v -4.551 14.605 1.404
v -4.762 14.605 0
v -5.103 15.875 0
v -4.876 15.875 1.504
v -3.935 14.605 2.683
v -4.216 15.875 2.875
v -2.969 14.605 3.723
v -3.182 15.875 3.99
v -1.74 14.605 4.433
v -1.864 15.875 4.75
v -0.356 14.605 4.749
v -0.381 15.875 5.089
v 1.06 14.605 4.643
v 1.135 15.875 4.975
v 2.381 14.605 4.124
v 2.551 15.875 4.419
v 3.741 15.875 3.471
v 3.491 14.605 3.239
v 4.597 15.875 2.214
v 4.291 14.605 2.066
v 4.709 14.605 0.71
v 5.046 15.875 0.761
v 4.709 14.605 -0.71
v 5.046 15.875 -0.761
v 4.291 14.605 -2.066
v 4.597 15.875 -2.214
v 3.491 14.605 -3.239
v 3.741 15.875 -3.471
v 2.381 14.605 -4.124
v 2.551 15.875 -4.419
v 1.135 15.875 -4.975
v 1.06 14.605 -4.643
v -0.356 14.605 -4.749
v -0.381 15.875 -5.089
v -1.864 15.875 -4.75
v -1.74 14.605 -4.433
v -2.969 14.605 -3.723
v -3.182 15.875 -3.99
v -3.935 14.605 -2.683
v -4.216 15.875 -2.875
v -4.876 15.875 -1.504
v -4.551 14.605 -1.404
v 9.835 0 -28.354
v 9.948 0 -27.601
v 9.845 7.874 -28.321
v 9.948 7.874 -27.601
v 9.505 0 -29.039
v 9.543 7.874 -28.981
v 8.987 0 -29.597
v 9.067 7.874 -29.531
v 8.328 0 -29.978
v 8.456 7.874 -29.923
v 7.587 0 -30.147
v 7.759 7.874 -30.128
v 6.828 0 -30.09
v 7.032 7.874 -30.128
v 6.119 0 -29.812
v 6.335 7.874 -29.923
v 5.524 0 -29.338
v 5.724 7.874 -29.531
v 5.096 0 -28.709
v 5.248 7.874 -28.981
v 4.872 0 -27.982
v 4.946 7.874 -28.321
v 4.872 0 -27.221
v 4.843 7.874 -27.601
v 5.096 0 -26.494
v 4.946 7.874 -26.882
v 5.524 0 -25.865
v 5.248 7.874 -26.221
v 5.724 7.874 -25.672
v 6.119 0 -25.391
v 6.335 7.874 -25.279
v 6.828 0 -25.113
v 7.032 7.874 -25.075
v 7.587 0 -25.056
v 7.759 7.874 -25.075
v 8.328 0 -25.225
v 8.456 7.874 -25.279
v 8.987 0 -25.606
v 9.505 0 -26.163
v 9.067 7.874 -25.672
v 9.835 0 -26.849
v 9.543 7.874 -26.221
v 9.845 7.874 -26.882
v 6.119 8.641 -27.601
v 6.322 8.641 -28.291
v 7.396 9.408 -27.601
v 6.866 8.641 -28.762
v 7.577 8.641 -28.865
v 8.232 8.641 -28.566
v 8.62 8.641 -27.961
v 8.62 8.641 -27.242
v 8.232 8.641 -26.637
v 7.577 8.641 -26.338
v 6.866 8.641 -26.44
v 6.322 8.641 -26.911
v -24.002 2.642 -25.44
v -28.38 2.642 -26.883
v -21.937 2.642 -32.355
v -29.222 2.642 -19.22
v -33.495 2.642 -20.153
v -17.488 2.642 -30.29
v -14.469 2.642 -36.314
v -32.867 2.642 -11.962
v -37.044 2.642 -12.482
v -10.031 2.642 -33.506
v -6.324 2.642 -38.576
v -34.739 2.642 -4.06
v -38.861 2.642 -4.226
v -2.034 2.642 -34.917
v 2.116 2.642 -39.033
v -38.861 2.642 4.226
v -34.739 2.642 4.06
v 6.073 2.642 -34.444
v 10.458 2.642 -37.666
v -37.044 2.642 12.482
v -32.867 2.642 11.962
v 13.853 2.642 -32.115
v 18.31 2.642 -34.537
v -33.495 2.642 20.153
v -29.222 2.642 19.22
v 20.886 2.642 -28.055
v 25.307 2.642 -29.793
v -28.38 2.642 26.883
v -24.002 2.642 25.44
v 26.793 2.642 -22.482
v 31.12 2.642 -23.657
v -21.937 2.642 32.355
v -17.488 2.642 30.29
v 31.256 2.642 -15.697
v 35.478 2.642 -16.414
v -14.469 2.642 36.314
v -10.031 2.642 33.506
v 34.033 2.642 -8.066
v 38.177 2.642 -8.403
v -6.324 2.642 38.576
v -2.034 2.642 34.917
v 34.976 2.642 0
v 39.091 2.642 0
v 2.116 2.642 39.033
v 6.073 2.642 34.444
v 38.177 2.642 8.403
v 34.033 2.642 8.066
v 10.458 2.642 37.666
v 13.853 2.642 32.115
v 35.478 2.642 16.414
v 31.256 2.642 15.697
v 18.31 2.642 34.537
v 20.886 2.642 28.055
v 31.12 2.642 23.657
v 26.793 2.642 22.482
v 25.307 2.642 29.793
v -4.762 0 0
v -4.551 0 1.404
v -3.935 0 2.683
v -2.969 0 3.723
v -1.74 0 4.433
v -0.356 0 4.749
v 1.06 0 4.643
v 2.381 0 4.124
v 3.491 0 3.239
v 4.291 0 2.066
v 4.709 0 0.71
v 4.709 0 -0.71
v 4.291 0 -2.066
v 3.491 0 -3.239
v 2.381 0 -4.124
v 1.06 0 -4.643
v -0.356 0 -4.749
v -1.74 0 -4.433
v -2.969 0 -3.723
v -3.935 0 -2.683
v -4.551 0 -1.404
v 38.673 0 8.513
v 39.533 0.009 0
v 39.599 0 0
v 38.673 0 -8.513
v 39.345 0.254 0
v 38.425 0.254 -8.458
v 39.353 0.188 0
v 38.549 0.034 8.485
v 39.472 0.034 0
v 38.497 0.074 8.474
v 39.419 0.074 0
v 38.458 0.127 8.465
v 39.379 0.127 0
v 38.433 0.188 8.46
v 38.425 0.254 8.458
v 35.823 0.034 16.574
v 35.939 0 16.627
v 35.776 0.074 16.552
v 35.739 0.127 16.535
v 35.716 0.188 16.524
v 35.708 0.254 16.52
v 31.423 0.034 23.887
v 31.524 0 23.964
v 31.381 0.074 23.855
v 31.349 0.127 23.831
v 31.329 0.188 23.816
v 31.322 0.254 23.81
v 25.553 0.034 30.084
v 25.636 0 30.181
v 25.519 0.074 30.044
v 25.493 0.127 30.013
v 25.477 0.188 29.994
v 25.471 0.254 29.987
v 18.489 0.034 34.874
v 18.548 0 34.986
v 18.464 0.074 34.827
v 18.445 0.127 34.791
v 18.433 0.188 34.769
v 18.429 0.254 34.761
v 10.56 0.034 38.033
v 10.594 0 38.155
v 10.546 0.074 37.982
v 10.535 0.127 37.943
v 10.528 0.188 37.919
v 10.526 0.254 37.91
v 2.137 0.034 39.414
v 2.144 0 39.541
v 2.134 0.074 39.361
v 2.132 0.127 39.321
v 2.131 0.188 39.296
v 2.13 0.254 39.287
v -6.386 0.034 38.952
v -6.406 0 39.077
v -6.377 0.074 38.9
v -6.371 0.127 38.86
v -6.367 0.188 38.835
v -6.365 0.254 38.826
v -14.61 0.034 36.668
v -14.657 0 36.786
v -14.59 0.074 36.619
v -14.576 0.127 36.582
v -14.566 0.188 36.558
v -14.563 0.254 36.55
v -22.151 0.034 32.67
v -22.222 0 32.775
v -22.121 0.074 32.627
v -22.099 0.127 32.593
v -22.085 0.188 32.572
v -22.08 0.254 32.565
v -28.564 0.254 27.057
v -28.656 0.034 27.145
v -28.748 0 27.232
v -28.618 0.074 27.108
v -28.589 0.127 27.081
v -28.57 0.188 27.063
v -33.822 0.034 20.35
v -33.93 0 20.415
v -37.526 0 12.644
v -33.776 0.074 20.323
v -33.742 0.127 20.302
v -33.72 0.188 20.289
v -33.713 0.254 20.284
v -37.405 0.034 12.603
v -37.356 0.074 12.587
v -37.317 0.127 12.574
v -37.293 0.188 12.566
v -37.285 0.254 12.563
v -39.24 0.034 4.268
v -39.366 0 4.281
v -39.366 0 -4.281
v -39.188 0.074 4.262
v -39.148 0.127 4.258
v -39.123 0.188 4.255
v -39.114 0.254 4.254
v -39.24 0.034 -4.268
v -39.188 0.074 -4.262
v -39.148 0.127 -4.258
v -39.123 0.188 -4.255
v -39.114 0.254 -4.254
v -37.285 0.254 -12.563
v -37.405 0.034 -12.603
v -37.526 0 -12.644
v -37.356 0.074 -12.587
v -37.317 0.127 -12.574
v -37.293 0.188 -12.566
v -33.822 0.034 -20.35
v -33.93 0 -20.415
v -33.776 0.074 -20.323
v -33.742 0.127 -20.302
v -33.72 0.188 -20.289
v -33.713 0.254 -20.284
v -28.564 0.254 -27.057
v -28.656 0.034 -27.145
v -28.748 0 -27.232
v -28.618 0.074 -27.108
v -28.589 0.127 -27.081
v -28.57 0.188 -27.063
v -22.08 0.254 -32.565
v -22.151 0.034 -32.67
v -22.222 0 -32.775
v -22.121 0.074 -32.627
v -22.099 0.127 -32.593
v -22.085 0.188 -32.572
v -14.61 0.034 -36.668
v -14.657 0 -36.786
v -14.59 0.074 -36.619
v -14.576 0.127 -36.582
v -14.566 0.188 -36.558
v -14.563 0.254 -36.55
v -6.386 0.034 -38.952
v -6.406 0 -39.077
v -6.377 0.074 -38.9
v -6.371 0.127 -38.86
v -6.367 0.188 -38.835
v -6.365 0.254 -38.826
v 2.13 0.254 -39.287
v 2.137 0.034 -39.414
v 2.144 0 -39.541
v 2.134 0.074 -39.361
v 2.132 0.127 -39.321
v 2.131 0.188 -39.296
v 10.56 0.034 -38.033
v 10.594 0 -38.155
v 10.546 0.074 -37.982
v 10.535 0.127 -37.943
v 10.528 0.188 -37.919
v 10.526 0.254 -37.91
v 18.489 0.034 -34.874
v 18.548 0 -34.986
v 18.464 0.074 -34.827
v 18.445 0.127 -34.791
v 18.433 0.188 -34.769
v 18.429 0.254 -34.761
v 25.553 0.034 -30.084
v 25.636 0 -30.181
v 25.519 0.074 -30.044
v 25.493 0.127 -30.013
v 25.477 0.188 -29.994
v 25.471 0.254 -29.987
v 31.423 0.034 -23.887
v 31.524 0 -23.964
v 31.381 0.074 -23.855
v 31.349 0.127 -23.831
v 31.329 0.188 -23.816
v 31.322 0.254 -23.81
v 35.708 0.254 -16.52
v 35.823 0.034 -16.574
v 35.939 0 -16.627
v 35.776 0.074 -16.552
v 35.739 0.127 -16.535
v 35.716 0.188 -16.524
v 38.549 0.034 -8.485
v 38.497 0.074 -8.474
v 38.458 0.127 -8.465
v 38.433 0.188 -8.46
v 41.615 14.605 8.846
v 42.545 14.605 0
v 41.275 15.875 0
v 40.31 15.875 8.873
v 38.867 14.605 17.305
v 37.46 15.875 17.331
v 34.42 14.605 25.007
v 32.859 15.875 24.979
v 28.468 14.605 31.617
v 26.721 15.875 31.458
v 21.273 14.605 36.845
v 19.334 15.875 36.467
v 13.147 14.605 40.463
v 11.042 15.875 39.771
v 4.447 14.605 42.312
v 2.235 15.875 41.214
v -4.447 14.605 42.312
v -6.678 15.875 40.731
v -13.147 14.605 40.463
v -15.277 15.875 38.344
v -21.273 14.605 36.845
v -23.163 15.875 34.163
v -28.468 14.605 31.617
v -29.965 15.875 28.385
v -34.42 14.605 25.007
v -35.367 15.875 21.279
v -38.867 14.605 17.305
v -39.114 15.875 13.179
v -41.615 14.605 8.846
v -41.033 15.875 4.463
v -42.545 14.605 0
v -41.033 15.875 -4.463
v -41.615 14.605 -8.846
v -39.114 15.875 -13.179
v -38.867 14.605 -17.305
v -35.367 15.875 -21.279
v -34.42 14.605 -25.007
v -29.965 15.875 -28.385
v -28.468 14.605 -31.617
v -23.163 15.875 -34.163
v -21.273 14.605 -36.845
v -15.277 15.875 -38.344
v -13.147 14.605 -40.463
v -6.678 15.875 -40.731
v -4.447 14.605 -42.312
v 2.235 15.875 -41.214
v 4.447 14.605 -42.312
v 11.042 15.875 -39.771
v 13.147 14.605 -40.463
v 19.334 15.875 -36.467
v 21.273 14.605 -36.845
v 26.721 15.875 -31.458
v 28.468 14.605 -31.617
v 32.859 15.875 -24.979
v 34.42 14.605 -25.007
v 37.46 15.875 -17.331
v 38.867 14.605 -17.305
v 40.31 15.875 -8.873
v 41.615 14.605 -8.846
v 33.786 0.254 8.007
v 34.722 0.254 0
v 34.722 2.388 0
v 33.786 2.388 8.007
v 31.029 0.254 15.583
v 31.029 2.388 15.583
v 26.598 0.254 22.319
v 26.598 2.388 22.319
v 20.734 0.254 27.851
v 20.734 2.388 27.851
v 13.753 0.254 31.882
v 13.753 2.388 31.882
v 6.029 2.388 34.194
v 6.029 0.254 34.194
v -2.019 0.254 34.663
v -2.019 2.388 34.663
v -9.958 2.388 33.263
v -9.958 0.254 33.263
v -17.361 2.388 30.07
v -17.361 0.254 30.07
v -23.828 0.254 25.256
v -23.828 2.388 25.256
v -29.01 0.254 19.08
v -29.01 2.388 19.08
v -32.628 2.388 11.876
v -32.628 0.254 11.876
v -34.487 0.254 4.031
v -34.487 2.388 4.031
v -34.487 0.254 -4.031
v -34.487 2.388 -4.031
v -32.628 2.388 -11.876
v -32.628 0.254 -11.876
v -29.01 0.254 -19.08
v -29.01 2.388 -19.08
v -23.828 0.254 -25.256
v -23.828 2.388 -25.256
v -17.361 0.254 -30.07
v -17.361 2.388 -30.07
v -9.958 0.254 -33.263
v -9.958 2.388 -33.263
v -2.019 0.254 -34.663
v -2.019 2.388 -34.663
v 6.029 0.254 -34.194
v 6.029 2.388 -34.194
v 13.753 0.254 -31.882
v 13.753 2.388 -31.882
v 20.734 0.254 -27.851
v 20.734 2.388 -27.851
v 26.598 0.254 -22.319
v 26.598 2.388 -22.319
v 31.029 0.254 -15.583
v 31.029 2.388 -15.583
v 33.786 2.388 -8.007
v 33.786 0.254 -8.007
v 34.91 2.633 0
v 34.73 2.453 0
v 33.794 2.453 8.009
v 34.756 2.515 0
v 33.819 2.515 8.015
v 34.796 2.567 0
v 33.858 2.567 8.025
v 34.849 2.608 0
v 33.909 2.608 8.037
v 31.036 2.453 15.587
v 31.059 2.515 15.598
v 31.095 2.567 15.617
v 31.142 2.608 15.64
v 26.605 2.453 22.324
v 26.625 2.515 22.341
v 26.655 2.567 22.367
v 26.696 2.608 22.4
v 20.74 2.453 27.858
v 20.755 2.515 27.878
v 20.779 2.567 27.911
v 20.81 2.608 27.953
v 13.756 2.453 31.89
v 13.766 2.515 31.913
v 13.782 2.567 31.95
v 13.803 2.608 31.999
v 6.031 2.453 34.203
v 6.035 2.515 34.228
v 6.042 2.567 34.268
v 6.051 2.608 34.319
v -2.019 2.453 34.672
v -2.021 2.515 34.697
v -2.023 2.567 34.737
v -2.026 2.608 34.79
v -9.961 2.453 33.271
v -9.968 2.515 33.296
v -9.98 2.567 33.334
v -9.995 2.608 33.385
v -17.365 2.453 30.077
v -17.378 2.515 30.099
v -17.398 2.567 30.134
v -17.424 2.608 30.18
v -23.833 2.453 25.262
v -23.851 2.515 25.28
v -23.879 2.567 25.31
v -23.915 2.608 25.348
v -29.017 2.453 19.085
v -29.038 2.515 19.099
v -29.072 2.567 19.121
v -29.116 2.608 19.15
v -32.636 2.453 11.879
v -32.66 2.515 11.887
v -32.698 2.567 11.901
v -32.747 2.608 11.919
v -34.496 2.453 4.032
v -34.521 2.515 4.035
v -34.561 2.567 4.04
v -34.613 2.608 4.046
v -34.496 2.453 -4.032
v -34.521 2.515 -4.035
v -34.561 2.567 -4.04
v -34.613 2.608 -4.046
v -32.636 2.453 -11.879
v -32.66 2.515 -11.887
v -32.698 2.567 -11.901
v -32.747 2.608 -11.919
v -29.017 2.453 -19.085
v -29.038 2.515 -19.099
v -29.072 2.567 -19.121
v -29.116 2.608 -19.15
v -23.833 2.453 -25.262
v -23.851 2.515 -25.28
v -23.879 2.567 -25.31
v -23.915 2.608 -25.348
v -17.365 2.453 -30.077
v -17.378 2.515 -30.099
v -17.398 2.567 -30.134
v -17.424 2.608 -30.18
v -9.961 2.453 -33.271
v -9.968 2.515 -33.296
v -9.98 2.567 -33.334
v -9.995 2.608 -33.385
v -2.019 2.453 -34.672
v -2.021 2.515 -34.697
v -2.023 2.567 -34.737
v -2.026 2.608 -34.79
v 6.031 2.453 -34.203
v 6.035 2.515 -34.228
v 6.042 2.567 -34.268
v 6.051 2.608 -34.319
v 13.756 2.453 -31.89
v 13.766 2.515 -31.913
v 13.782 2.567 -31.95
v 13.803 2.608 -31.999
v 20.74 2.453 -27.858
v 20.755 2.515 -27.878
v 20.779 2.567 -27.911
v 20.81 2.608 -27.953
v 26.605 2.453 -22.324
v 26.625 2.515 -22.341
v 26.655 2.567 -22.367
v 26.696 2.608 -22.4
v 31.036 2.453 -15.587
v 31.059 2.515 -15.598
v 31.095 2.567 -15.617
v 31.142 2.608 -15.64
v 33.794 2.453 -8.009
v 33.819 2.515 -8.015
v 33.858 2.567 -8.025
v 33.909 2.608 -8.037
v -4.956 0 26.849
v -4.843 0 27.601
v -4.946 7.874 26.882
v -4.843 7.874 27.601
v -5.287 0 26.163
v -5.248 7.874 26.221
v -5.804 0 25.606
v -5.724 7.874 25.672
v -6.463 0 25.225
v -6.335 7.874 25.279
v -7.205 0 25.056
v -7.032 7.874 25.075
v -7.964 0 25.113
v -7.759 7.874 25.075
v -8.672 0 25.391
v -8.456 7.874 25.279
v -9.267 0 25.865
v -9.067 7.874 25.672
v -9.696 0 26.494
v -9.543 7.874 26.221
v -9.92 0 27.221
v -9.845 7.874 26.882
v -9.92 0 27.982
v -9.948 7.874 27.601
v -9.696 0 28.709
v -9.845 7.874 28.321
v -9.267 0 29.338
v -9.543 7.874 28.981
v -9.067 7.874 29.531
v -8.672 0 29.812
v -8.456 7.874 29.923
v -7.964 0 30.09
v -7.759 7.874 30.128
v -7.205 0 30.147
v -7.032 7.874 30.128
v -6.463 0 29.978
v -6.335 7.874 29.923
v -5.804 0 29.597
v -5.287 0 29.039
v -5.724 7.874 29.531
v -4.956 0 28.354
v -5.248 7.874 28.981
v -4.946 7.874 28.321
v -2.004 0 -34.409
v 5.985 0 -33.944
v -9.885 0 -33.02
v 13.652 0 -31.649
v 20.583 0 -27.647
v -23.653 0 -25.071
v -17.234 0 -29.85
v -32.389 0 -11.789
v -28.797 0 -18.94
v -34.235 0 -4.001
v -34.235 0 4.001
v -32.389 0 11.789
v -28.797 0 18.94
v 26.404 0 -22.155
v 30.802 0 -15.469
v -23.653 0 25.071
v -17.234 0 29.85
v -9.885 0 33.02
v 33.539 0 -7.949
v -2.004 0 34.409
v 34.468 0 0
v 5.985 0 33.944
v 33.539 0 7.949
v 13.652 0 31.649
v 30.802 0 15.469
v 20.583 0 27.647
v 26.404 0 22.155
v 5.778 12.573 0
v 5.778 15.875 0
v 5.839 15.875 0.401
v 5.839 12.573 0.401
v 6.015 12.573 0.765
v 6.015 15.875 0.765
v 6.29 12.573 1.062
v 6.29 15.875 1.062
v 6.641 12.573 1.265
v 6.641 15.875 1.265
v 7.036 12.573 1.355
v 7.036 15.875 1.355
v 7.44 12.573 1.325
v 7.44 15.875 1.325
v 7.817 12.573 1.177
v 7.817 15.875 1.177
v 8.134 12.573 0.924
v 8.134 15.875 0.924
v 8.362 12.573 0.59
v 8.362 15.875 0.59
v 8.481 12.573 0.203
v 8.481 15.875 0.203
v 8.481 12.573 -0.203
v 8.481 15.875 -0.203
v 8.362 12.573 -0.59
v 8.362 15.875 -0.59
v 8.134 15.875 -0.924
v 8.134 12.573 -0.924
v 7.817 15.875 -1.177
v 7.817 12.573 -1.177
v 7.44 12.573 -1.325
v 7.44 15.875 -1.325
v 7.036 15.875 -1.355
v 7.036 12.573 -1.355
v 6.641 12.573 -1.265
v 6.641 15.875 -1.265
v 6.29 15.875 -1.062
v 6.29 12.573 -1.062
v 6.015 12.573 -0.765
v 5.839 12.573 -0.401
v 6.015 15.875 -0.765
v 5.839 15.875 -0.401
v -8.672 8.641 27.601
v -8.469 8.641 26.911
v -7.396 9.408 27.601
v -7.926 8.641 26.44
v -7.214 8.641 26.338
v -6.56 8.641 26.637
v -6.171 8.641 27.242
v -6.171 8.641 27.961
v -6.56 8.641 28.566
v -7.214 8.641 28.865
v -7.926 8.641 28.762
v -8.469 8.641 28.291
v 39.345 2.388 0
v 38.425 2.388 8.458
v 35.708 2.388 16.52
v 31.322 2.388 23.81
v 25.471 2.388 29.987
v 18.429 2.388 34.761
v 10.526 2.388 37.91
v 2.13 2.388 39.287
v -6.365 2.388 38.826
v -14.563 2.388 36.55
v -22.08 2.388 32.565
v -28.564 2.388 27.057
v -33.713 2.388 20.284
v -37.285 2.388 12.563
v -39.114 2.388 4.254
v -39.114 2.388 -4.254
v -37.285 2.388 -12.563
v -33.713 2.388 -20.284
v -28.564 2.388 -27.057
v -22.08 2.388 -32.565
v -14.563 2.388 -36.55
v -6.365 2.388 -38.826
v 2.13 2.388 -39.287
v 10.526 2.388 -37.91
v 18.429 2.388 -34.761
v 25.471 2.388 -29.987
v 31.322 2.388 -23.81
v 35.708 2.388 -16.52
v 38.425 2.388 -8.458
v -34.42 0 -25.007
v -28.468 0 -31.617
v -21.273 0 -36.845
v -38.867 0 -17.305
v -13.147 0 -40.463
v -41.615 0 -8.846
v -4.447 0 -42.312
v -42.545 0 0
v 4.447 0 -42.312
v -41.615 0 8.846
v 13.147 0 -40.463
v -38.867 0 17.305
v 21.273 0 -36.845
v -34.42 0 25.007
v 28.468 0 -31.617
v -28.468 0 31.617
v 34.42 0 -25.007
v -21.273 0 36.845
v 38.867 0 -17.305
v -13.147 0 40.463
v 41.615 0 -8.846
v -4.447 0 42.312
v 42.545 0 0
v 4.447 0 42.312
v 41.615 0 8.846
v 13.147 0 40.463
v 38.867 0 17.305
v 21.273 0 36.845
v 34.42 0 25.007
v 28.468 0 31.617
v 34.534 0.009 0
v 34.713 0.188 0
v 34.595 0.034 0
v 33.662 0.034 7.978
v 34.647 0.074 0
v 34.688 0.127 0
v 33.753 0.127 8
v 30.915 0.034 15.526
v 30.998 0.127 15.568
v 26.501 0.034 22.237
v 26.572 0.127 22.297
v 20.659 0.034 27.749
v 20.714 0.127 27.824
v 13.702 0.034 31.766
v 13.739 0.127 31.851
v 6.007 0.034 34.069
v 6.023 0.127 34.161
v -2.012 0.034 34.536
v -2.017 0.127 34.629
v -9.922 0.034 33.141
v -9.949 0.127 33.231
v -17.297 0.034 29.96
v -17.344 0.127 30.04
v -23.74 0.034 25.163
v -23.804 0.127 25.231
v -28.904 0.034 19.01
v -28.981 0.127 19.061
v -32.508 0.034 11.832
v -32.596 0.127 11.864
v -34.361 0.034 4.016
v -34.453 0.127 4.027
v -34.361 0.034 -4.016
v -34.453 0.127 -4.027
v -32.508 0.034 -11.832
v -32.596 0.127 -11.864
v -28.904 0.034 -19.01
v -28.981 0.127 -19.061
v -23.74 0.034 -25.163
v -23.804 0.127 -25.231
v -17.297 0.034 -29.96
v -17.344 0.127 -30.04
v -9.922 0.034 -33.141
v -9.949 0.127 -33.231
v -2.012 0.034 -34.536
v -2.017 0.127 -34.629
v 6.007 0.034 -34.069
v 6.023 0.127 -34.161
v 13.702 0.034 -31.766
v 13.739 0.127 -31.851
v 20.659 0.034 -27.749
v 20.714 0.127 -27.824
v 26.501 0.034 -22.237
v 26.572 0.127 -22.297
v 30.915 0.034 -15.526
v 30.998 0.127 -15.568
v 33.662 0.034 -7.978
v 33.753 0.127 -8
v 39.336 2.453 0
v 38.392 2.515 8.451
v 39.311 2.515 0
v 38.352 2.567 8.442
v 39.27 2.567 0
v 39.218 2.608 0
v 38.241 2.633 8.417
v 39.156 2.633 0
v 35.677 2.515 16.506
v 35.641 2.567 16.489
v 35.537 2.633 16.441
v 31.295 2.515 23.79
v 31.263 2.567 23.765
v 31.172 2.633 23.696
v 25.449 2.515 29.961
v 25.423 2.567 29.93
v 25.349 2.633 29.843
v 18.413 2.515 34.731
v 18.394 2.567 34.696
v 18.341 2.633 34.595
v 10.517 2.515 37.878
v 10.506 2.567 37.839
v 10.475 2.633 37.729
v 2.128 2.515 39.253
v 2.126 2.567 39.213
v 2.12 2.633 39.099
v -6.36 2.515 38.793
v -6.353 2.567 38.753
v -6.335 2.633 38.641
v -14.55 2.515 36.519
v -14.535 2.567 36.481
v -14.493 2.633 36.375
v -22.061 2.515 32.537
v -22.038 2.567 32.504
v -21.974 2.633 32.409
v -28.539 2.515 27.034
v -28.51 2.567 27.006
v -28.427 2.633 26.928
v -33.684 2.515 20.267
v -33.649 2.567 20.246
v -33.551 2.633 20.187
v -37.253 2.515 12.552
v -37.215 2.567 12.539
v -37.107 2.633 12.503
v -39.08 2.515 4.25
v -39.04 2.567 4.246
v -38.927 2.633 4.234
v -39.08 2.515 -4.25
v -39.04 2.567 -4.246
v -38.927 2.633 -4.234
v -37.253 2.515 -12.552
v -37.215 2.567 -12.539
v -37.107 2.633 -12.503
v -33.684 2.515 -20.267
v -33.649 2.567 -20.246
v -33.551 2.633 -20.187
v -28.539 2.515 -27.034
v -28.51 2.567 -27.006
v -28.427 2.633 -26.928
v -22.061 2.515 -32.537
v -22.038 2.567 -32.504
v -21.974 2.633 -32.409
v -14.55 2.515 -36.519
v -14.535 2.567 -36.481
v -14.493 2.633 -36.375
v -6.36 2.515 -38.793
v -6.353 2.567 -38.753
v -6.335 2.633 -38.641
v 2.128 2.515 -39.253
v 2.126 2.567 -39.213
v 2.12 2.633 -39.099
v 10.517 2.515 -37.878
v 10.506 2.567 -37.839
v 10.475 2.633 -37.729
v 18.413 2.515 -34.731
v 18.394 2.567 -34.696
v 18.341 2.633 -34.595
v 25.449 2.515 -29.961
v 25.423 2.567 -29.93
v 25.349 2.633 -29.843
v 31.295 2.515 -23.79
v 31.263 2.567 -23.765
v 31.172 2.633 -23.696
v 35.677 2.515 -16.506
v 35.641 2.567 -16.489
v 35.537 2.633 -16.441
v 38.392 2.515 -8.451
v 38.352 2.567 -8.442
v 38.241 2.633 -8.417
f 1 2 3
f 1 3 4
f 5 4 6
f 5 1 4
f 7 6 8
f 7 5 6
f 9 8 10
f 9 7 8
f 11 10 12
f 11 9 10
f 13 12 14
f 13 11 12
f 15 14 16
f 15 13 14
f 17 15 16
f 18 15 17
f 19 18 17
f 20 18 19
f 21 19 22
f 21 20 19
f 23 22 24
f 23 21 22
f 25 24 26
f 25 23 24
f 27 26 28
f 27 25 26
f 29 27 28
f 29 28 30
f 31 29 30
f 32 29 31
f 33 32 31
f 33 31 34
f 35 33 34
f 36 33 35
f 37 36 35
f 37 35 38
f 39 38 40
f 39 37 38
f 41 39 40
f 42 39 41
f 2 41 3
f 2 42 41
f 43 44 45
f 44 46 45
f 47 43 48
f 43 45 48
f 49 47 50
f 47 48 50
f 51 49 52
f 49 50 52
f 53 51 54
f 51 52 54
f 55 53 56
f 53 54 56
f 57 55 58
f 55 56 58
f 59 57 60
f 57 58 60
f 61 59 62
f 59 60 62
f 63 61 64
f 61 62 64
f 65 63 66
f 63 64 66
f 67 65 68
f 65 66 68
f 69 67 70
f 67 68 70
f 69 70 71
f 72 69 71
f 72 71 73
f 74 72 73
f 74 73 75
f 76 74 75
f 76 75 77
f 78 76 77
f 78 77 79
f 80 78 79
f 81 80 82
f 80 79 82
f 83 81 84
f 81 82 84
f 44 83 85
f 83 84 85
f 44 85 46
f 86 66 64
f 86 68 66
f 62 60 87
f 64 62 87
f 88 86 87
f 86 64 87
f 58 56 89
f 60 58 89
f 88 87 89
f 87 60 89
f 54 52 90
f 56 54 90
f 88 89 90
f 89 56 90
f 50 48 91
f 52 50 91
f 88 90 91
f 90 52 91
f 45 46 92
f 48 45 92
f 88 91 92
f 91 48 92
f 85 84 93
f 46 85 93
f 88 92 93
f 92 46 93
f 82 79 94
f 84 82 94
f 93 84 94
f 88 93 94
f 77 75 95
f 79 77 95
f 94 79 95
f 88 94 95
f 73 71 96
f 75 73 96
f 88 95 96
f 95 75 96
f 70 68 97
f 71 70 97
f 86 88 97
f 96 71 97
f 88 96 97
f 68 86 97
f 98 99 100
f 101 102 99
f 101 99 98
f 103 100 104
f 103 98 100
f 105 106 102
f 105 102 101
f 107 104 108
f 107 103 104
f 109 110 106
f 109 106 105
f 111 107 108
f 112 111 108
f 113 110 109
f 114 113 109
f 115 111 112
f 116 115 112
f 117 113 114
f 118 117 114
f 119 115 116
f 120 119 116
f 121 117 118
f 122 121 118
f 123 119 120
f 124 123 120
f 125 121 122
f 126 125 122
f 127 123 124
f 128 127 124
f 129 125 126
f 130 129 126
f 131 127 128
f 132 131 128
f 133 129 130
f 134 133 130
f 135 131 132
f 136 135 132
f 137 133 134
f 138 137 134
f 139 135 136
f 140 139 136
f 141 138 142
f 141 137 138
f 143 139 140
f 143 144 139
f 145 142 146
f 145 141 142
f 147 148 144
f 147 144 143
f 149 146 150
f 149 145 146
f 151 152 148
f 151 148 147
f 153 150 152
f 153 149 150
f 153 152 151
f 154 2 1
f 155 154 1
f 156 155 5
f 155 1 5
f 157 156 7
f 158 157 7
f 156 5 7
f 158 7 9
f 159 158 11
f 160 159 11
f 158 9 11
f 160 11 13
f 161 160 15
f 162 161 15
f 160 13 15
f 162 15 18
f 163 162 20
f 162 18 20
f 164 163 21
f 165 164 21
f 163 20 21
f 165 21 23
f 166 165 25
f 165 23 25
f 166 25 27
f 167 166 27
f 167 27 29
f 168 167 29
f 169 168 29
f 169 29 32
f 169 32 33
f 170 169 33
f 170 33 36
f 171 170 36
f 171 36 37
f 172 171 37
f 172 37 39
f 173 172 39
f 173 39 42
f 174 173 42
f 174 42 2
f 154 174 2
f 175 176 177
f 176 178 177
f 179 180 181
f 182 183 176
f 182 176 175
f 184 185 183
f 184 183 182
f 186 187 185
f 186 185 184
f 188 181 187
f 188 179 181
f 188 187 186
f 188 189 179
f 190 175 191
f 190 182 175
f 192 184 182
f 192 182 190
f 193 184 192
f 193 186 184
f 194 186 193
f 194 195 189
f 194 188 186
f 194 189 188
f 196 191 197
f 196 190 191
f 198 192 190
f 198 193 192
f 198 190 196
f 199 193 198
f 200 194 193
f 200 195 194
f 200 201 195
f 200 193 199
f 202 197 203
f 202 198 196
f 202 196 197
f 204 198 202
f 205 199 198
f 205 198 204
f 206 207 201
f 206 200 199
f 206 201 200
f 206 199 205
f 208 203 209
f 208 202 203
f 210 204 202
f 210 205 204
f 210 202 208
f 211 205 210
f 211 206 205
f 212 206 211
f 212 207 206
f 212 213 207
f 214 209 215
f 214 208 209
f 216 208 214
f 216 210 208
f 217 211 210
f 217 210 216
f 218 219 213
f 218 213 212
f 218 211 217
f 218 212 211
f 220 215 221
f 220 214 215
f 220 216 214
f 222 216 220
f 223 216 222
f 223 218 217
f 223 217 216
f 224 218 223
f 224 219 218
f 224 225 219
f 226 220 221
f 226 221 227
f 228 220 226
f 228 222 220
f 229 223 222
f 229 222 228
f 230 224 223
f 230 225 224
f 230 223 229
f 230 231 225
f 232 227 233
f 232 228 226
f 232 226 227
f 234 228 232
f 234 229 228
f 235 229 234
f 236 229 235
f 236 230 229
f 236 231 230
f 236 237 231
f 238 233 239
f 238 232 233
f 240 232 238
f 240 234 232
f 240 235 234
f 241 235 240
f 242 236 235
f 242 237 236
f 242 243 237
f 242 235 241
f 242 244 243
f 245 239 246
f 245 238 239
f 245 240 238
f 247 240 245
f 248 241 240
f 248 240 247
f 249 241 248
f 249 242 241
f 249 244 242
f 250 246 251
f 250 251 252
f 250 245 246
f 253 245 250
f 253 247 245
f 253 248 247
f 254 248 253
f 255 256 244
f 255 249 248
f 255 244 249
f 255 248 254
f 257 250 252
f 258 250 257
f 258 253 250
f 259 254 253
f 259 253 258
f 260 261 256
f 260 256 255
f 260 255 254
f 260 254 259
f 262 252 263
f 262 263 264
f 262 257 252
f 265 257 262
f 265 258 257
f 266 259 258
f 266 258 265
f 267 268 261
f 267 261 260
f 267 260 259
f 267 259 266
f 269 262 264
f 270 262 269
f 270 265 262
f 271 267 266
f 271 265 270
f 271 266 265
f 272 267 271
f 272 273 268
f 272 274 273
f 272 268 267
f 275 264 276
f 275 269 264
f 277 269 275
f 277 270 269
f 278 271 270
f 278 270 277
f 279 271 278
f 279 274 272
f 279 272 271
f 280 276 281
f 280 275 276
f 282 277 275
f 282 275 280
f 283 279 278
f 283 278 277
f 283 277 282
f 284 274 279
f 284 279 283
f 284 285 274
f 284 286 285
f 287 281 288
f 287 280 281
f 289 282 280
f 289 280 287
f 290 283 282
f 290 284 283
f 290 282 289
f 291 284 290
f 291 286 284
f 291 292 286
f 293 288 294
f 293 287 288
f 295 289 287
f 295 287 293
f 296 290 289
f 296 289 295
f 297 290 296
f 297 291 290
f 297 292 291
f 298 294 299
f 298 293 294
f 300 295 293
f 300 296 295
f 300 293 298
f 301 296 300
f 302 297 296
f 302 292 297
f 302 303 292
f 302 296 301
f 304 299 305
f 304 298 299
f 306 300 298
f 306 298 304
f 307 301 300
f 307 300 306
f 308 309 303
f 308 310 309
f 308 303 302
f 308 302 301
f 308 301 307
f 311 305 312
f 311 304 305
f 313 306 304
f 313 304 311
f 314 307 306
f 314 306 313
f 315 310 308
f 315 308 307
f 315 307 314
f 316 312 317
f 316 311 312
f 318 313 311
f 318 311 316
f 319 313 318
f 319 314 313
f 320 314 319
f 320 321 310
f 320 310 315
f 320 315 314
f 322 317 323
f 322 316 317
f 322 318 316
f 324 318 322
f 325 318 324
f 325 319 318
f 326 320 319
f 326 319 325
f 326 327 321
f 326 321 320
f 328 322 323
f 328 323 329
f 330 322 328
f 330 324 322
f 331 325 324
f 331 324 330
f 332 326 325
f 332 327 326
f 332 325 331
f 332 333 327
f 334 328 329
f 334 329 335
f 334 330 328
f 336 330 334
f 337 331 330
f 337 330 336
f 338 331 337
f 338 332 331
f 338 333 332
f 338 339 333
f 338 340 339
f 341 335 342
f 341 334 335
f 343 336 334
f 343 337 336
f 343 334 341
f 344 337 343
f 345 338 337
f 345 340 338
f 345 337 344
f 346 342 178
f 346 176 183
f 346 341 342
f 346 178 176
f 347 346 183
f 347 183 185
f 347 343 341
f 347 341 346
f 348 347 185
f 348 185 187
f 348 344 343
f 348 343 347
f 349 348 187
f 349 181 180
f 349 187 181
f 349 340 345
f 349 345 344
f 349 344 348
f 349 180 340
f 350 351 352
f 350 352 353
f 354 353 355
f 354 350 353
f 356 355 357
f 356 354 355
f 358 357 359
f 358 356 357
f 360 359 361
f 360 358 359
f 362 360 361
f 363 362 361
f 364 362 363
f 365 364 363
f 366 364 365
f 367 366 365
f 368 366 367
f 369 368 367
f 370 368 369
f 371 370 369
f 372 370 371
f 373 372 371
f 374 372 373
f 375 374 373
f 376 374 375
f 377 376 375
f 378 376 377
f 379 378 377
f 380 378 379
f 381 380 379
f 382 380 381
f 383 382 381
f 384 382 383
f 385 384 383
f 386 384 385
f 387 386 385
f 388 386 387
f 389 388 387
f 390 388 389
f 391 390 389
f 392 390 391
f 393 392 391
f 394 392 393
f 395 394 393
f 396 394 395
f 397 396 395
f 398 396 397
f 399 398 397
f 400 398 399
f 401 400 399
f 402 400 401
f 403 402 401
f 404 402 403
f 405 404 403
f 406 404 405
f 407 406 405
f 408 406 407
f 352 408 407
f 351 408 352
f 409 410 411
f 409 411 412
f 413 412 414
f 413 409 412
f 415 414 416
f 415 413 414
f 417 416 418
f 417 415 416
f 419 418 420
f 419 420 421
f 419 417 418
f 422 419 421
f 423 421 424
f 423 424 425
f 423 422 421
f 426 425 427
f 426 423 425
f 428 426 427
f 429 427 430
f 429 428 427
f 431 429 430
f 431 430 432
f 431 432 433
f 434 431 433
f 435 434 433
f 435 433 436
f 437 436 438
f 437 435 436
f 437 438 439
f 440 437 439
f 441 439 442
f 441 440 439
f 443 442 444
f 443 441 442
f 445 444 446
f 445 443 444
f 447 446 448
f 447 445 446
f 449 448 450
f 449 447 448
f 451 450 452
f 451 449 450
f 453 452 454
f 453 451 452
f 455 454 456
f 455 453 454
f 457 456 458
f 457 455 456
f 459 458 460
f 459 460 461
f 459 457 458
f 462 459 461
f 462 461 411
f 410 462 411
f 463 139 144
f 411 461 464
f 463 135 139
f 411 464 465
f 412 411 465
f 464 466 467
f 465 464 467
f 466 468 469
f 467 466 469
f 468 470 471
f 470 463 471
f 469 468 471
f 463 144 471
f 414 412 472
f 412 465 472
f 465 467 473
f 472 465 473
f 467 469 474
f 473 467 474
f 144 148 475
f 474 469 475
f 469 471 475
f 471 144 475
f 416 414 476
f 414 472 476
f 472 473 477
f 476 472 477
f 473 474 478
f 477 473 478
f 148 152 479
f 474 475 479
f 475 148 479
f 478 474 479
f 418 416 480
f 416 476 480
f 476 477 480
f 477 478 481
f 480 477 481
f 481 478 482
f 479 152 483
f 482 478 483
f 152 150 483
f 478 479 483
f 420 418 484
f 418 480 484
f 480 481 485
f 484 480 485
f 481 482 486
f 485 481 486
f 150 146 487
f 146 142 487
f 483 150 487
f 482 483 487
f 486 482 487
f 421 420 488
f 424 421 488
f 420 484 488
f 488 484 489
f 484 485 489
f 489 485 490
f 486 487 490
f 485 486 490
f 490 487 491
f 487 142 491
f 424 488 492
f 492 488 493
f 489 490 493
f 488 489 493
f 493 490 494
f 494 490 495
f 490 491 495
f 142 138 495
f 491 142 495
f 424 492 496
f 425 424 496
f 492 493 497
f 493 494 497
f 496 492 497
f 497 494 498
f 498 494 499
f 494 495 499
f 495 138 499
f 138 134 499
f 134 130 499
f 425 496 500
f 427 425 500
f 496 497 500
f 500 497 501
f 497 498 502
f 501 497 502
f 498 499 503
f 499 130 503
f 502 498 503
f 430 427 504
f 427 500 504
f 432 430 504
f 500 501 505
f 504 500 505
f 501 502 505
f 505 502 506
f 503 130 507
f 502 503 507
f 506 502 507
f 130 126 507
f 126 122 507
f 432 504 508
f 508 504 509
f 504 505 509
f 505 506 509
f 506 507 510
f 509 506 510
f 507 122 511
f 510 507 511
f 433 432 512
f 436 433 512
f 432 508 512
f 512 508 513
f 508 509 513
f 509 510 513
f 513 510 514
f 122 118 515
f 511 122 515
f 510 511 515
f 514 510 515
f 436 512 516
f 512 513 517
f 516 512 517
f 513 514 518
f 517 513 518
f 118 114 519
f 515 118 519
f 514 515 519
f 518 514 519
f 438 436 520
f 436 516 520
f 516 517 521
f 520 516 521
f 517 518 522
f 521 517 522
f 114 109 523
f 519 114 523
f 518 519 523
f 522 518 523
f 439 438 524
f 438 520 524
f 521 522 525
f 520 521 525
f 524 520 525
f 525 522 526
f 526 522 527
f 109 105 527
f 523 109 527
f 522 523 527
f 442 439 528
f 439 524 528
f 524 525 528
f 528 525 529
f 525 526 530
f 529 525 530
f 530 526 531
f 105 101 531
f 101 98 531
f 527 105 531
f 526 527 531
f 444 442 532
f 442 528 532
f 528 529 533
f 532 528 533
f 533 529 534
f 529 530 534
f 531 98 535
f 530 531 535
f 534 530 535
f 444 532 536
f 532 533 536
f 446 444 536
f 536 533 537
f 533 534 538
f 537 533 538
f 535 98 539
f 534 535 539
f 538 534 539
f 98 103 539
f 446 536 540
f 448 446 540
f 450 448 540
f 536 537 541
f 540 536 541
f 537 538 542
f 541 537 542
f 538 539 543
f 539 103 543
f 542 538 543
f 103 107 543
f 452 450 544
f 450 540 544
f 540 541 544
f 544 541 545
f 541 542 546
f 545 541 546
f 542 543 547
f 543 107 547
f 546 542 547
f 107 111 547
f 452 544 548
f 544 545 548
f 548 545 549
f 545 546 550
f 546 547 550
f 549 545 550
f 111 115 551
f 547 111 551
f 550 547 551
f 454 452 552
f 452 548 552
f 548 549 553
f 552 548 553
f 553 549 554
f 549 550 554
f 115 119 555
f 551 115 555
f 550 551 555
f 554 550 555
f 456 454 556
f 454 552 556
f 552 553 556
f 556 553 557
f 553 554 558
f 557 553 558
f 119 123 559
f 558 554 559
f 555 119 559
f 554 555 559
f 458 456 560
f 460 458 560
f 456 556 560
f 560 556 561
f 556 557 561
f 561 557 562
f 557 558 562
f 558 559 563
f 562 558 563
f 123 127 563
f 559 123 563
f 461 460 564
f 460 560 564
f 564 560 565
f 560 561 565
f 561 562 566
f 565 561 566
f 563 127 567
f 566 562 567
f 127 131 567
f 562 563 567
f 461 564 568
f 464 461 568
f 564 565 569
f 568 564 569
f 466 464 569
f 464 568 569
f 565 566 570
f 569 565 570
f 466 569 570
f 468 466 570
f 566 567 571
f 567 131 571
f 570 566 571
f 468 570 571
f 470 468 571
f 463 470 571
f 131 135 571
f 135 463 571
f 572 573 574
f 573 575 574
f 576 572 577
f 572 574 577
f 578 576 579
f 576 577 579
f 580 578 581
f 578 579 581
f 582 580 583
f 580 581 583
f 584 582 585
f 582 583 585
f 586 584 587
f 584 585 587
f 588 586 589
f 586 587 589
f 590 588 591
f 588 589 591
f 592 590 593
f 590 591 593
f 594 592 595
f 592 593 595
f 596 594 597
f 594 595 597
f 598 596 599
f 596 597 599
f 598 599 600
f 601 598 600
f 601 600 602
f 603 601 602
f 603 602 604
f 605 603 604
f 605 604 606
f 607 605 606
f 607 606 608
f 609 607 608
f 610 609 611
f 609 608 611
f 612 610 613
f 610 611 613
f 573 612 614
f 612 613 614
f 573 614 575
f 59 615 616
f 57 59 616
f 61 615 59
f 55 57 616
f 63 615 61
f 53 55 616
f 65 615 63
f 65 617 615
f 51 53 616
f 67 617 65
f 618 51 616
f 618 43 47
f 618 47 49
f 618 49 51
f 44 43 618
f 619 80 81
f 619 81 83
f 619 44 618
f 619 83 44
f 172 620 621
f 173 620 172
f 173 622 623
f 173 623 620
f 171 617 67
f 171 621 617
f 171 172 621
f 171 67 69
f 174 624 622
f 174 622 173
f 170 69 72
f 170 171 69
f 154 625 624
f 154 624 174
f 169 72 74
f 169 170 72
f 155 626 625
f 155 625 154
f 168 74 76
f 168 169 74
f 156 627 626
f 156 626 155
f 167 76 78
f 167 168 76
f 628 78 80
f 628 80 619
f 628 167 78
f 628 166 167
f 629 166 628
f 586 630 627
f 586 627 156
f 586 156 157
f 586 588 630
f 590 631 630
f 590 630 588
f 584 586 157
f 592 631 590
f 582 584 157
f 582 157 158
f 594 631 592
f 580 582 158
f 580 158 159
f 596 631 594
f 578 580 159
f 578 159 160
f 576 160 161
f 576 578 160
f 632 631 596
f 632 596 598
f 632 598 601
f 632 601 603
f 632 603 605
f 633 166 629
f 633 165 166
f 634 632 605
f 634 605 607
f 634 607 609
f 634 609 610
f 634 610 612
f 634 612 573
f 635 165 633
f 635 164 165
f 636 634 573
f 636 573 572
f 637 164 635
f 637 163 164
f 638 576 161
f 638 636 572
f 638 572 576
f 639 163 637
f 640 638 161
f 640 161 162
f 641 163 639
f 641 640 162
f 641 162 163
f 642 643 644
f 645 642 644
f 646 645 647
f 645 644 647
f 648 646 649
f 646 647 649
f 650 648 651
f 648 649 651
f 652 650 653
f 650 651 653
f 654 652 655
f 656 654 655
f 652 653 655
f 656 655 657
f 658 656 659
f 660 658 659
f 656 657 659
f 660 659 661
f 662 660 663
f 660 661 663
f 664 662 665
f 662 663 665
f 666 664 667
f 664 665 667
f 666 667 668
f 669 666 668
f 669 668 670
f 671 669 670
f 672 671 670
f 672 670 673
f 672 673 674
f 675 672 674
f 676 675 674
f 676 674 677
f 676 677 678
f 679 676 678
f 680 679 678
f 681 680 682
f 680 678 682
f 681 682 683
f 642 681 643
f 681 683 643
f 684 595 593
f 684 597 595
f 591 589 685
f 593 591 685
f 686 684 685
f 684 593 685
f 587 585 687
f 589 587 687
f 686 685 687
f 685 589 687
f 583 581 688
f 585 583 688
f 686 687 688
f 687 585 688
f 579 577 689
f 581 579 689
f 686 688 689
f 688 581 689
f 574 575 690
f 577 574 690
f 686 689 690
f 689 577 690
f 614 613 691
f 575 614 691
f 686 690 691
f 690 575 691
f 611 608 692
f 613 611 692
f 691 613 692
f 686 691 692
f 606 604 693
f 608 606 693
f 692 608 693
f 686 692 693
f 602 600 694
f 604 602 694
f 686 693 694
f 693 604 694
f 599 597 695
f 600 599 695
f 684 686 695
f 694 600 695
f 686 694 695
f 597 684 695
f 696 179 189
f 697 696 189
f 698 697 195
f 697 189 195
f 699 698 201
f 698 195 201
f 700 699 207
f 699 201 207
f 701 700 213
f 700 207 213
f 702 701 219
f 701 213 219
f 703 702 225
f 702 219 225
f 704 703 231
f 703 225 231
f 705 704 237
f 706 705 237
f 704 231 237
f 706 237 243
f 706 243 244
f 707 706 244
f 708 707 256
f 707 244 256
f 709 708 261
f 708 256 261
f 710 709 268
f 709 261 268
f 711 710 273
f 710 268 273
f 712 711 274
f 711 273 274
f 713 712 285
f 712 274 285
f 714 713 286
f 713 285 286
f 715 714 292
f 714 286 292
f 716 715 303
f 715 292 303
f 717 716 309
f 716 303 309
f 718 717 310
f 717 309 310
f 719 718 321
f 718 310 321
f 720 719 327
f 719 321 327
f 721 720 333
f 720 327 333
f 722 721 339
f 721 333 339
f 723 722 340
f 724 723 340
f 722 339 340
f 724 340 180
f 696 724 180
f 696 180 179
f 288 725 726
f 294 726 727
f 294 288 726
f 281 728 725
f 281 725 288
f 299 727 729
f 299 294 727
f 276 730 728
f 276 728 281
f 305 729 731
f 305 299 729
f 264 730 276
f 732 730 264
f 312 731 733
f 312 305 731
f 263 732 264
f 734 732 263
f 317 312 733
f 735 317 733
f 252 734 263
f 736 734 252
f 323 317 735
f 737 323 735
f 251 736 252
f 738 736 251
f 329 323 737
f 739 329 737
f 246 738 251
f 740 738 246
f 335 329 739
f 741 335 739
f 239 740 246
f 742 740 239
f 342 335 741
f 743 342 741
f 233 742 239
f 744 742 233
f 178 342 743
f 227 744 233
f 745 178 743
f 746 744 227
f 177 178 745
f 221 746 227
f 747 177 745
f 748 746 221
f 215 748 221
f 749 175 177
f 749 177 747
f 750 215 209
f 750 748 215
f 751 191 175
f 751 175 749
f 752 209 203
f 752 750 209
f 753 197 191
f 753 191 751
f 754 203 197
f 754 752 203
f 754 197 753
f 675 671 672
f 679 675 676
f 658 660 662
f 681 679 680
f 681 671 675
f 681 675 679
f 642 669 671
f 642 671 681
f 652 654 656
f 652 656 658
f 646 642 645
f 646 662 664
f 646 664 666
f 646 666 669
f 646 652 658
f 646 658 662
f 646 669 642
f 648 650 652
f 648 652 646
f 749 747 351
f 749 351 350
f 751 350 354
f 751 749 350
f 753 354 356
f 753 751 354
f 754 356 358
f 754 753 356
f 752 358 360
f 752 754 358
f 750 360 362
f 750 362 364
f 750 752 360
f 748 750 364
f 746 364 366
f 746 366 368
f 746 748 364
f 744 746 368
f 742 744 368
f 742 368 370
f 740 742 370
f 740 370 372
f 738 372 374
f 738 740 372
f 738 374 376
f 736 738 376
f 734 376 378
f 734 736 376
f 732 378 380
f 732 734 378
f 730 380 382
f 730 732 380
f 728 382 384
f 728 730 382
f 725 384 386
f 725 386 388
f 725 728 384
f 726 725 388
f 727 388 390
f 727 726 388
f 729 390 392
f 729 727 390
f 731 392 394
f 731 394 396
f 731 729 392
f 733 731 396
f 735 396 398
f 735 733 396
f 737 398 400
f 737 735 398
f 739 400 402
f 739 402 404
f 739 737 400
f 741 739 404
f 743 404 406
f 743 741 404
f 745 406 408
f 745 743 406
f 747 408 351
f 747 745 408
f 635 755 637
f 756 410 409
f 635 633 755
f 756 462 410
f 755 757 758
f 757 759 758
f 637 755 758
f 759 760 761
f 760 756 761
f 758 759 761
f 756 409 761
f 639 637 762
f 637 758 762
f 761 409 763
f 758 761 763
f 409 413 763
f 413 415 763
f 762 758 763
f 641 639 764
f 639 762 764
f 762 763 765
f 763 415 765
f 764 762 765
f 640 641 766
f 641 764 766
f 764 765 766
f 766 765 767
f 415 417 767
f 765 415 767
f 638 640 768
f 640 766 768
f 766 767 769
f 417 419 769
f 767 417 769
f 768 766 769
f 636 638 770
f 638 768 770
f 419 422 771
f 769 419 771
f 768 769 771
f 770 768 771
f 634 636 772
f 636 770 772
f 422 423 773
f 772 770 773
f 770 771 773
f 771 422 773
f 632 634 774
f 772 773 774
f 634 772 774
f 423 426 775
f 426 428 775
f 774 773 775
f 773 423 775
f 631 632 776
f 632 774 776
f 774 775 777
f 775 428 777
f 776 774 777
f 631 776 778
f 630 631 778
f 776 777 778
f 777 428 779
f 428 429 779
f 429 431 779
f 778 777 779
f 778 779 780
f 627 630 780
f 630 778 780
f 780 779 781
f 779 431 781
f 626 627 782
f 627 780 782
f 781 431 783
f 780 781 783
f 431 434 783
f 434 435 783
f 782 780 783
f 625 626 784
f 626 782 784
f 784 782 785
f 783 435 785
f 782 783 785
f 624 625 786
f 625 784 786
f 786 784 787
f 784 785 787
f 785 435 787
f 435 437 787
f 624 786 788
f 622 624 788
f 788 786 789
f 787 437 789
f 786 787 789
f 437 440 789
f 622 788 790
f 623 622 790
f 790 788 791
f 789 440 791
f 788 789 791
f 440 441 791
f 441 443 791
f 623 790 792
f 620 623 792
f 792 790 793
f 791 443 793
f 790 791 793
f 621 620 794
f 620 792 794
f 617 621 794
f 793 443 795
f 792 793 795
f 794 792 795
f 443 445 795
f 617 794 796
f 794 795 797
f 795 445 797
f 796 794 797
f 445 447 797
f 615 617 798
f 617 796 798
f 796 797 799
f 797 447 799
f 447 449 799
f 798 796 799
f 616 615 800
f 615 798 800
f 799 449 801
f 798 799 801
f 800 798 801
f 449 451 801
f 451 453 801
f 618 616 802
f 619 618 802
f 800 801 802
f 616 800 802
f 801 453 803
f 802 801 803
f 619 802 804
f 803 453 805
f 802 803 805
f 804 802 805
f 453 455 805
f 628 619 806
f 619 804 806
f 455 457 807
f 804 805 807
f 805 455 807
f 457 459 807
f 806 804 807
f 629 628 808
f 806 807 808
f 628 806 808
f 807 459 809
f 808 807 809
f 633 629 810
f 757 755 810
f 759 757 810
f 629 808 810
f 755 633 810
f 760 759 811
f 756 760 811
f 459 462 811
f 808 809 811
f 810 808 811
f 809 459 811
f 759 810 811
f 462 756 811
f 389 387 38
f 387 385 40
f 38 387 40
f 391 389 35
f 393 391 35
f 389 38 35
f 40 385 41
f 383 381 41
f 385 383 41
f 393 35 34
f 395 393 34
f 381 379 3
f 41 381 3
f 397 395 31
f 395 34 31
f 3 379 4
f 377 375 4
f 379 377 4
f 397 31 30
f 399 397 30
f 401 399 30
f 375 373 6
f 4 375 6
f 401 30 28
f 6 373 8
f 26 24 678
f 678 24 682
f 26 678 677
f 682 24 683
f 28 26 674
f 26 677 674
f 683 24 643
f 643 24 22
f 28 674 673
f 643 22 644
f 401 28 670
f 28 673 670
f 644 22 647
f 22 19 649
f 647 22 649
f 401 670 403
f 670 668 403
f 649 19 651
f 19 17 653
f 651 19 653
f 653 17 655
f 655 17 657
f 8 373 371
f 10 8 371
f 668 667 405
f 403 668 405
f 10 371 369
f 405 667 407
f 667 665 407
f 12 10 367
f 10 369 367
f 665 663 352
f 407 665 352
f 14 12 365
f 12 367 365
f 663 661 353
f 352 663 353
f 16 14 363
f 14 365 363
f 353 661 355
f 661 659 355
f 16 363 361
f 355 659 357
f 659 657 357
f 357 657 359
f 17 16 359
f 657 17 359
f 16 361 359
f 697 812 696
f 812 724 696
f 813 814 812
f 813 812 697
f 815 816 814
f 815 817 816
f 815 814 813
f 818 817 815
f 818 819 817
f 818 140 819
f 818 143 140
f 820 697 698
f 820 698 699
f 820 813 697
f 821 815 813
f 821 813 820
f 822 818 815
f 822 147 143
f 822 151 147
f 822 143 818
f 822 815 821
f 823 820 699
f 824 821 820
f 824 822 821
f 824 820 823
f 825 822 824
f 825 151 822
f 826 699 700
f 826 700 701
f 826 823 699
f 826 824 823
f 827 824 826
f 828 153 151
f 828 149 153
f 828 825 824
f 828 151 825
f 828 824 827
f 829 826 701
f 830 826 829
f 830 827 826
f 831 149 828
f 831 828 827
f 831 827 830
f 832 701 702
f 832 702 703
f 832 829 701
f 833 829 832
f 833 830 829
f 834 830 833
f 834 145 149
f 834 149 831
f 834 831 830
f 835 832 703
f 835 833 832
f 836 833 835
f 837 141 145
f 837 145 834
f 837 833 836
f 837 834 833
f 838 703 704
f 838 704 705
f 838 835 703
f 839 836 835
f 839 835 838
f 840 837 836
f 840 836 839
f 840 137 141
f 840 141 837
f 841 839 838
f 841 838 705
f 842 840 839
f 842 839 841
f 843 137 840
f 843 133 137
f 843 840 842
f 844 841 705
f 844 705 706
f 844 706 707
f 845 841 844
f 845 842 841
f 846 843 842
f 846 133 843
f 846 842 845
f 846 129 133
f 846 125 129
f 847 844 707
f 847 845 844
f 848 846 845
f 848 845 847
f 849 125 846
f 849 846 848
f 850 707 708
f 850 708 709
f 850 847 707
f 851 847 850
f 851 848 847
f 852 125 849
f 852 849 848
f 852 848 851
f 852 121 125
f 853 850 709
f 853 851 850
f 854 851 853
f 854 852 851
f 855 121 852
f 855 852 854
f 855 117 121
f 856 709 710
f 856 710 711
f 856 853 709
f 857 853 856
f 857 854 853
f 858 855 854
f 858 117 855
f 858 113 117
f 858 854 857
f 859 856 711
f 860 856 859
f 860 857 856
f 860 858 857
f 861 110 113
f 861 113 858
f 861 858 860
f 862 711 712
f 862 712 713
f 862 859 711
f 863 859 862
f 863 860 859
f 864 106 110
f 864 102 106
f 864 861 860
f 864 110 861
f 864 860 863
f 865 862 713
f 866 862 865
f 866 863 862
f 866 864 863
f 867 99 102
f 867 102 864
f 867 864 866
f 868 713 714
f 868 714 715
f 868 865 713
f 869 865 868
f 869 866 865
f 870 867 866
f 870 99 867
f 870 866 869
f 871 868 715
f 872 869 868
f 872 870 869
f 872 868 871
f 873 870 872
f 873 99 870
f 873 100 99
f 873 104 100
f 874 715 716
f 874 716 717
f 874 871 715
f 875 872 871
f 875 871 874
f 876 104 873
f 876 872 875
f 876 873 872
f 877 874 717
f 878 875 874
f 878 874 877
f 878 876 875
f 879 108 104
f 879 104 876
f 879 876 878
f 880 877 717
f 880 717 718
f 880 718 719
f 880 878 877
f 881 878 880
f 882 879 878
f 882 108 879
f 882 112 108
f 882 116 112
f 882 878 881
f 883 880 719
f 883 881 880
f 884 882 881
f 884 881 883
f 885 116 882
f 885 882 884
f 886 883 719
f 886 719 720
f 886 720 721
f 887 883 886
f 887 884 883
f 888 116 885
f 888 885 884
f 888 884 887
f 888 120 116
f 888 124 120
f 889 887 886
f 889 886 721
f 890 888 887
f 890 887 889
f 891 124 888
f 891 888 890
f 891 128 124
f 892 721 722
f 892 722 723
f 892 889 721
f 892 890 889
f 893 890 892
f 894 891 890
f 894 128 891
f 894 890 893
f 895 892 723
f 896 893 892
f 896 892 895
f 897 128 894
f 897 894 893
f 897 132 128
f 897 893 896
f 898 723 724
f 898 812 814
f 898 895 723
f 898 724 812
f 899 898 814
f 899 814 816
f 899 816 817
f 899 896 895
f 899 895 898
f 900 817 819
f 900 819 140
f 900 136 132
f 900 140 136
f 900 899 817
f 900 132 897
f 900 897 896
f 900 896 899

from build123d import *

# Parameters (mm, degrees)
SKETCH1_R                   = 42.545
BOSS_EXTRUDE1_DEPTH         = 15.875
SKETCH2_R                   = 39.3446
SKETCH2_R_2                 = 34.7218
GROOVE_232ORING_DEPTH       = 2.6416
F_1_4_20_TAPPED_HOLE1_D     = 5.1054
F_1_4_20_TAPPED_HOLE1_DEPTH = 7.874
F_1_4_20_TAPPED_HOLE1_TIP   = 1.533816902
SKETCH7_R                   = 4.7625
CUT_EXTRUDE2_DEPTH          = 16.875
SKETCH8_R                   = 1.3589
CUT_EXTRUDE3_DEPTH          = 3.302
CHAMFER1_SIZE               = 0.340295474
CHAMFER1_SIZE2              = 1.27
CHAMFER2_SIZE               = 1.27
FILLET1_R                   = 0.254


with BuildPart() as part:
    # Sketch1 → Boss-Extrude1 (new body)
    with BuildSketch(Plane.XZ):
        Circle(SKETCH1_R)
    extrude(amount=-BOSS_EXTRUDE1_DEPTH)

    # Sketch2 → Groove_232Oring (cut)
    with BuildSketch(Plane.XZ):
        Circle(SKETCH2_R)
        Circle(SKETCH2_R_2, mode=Mode.SUBTRACT)
    extrude(amount=-GROOVE_232ORING_DEPTH, mode=Mode.SUBTRACT)

    # 1/4-20 Tapped Hole1
    with Locations(Plane(origin=(0, 0, 0), x_dir=(-1, 0, 0), z_dir=(0, -1, 0))):
        with Locations((-7.395754214, 27.601330486), (7.395754214, -27.601330486)):
            Hole(F_1_4_20_TAPPED_HOLE1_D / 2, depth=F_1_4_20_TAPPED_HOLE1_DEPTH)
            with Locations((0, 0, -(F_1_4_20_TAPPED_HOLE1_DEPTH + F_1_4_20_TAPPED_HOLE1_TIP / 2))):  # 118° drill point
                Cone(0, F_1_4_20_TAPPED_HOLE1_D / 2, F_1_4_20_TAPPED_HOLE1_TIP, mode=Mode.SUBTRACT)

    # Sketch7 → Cut-Extrude2 (cut, through all)
    with BuildSketch(Plane(origin=(0, 15.875, 0), x_dir=(-1, 0, 0), z_dir=(0, 1, 0))):
        Circle(SKETCH7_R)
    extrude(amount=-CUT_EXTRUDE2_DEPTH, mode=Mode.SUBTRACT)

    # Sketch8 → Cut-Extrude3 (cut)
    with BuildSketch(Plane(origin=(0, 15.875, 0), x_dir=(-1, 0, 0), z_dir=(0, 1, 0))):
        with Locations((-7.1374, 0)):
            Circle(SKETCH8_R)
    extrude(amount=-CUT_EXTRUDE3_DEPTH, mode=Mode.SUBTRACT)

    # Chamfer1
    chamfer1_edges = [part.edges().sort_by_distance(p)[0] for p in [
        (4.7625, 15.875, 0),
    ]]
    chamfer1_side = [part.faces().sort_by_distance(p)[0] for p in [
        (-41.34164568, 15.875, 0),
    ]]
    chamfer(chamfer1_edges, length=CHAMFER1_SIZE, length2=CHAMFER1_SIZE2, reference=chamfer1_side[0])

    # Chamfer2
    chamfer2_edges = [part.edges().sort_by_distance(p)[0] for p in [
        (-42.545, 15.875, 0),
    ]]
    chamfer(chamfer2_edges, length=CHAMFER2_SIZE)

    # Fillet1
    fillet1_edges = [part.edges().sort_by_distance(p)[0] for p in [
        (-39.3446, 2.6416, 0),
        (-34.7218, 2.6416, 0),
        (-39.3446, 0, 0),
        (-34.7218, 0, 0),
    ]]
    fillet(fillet1_edges, radius=FILLET1_R)


solid = part.part
